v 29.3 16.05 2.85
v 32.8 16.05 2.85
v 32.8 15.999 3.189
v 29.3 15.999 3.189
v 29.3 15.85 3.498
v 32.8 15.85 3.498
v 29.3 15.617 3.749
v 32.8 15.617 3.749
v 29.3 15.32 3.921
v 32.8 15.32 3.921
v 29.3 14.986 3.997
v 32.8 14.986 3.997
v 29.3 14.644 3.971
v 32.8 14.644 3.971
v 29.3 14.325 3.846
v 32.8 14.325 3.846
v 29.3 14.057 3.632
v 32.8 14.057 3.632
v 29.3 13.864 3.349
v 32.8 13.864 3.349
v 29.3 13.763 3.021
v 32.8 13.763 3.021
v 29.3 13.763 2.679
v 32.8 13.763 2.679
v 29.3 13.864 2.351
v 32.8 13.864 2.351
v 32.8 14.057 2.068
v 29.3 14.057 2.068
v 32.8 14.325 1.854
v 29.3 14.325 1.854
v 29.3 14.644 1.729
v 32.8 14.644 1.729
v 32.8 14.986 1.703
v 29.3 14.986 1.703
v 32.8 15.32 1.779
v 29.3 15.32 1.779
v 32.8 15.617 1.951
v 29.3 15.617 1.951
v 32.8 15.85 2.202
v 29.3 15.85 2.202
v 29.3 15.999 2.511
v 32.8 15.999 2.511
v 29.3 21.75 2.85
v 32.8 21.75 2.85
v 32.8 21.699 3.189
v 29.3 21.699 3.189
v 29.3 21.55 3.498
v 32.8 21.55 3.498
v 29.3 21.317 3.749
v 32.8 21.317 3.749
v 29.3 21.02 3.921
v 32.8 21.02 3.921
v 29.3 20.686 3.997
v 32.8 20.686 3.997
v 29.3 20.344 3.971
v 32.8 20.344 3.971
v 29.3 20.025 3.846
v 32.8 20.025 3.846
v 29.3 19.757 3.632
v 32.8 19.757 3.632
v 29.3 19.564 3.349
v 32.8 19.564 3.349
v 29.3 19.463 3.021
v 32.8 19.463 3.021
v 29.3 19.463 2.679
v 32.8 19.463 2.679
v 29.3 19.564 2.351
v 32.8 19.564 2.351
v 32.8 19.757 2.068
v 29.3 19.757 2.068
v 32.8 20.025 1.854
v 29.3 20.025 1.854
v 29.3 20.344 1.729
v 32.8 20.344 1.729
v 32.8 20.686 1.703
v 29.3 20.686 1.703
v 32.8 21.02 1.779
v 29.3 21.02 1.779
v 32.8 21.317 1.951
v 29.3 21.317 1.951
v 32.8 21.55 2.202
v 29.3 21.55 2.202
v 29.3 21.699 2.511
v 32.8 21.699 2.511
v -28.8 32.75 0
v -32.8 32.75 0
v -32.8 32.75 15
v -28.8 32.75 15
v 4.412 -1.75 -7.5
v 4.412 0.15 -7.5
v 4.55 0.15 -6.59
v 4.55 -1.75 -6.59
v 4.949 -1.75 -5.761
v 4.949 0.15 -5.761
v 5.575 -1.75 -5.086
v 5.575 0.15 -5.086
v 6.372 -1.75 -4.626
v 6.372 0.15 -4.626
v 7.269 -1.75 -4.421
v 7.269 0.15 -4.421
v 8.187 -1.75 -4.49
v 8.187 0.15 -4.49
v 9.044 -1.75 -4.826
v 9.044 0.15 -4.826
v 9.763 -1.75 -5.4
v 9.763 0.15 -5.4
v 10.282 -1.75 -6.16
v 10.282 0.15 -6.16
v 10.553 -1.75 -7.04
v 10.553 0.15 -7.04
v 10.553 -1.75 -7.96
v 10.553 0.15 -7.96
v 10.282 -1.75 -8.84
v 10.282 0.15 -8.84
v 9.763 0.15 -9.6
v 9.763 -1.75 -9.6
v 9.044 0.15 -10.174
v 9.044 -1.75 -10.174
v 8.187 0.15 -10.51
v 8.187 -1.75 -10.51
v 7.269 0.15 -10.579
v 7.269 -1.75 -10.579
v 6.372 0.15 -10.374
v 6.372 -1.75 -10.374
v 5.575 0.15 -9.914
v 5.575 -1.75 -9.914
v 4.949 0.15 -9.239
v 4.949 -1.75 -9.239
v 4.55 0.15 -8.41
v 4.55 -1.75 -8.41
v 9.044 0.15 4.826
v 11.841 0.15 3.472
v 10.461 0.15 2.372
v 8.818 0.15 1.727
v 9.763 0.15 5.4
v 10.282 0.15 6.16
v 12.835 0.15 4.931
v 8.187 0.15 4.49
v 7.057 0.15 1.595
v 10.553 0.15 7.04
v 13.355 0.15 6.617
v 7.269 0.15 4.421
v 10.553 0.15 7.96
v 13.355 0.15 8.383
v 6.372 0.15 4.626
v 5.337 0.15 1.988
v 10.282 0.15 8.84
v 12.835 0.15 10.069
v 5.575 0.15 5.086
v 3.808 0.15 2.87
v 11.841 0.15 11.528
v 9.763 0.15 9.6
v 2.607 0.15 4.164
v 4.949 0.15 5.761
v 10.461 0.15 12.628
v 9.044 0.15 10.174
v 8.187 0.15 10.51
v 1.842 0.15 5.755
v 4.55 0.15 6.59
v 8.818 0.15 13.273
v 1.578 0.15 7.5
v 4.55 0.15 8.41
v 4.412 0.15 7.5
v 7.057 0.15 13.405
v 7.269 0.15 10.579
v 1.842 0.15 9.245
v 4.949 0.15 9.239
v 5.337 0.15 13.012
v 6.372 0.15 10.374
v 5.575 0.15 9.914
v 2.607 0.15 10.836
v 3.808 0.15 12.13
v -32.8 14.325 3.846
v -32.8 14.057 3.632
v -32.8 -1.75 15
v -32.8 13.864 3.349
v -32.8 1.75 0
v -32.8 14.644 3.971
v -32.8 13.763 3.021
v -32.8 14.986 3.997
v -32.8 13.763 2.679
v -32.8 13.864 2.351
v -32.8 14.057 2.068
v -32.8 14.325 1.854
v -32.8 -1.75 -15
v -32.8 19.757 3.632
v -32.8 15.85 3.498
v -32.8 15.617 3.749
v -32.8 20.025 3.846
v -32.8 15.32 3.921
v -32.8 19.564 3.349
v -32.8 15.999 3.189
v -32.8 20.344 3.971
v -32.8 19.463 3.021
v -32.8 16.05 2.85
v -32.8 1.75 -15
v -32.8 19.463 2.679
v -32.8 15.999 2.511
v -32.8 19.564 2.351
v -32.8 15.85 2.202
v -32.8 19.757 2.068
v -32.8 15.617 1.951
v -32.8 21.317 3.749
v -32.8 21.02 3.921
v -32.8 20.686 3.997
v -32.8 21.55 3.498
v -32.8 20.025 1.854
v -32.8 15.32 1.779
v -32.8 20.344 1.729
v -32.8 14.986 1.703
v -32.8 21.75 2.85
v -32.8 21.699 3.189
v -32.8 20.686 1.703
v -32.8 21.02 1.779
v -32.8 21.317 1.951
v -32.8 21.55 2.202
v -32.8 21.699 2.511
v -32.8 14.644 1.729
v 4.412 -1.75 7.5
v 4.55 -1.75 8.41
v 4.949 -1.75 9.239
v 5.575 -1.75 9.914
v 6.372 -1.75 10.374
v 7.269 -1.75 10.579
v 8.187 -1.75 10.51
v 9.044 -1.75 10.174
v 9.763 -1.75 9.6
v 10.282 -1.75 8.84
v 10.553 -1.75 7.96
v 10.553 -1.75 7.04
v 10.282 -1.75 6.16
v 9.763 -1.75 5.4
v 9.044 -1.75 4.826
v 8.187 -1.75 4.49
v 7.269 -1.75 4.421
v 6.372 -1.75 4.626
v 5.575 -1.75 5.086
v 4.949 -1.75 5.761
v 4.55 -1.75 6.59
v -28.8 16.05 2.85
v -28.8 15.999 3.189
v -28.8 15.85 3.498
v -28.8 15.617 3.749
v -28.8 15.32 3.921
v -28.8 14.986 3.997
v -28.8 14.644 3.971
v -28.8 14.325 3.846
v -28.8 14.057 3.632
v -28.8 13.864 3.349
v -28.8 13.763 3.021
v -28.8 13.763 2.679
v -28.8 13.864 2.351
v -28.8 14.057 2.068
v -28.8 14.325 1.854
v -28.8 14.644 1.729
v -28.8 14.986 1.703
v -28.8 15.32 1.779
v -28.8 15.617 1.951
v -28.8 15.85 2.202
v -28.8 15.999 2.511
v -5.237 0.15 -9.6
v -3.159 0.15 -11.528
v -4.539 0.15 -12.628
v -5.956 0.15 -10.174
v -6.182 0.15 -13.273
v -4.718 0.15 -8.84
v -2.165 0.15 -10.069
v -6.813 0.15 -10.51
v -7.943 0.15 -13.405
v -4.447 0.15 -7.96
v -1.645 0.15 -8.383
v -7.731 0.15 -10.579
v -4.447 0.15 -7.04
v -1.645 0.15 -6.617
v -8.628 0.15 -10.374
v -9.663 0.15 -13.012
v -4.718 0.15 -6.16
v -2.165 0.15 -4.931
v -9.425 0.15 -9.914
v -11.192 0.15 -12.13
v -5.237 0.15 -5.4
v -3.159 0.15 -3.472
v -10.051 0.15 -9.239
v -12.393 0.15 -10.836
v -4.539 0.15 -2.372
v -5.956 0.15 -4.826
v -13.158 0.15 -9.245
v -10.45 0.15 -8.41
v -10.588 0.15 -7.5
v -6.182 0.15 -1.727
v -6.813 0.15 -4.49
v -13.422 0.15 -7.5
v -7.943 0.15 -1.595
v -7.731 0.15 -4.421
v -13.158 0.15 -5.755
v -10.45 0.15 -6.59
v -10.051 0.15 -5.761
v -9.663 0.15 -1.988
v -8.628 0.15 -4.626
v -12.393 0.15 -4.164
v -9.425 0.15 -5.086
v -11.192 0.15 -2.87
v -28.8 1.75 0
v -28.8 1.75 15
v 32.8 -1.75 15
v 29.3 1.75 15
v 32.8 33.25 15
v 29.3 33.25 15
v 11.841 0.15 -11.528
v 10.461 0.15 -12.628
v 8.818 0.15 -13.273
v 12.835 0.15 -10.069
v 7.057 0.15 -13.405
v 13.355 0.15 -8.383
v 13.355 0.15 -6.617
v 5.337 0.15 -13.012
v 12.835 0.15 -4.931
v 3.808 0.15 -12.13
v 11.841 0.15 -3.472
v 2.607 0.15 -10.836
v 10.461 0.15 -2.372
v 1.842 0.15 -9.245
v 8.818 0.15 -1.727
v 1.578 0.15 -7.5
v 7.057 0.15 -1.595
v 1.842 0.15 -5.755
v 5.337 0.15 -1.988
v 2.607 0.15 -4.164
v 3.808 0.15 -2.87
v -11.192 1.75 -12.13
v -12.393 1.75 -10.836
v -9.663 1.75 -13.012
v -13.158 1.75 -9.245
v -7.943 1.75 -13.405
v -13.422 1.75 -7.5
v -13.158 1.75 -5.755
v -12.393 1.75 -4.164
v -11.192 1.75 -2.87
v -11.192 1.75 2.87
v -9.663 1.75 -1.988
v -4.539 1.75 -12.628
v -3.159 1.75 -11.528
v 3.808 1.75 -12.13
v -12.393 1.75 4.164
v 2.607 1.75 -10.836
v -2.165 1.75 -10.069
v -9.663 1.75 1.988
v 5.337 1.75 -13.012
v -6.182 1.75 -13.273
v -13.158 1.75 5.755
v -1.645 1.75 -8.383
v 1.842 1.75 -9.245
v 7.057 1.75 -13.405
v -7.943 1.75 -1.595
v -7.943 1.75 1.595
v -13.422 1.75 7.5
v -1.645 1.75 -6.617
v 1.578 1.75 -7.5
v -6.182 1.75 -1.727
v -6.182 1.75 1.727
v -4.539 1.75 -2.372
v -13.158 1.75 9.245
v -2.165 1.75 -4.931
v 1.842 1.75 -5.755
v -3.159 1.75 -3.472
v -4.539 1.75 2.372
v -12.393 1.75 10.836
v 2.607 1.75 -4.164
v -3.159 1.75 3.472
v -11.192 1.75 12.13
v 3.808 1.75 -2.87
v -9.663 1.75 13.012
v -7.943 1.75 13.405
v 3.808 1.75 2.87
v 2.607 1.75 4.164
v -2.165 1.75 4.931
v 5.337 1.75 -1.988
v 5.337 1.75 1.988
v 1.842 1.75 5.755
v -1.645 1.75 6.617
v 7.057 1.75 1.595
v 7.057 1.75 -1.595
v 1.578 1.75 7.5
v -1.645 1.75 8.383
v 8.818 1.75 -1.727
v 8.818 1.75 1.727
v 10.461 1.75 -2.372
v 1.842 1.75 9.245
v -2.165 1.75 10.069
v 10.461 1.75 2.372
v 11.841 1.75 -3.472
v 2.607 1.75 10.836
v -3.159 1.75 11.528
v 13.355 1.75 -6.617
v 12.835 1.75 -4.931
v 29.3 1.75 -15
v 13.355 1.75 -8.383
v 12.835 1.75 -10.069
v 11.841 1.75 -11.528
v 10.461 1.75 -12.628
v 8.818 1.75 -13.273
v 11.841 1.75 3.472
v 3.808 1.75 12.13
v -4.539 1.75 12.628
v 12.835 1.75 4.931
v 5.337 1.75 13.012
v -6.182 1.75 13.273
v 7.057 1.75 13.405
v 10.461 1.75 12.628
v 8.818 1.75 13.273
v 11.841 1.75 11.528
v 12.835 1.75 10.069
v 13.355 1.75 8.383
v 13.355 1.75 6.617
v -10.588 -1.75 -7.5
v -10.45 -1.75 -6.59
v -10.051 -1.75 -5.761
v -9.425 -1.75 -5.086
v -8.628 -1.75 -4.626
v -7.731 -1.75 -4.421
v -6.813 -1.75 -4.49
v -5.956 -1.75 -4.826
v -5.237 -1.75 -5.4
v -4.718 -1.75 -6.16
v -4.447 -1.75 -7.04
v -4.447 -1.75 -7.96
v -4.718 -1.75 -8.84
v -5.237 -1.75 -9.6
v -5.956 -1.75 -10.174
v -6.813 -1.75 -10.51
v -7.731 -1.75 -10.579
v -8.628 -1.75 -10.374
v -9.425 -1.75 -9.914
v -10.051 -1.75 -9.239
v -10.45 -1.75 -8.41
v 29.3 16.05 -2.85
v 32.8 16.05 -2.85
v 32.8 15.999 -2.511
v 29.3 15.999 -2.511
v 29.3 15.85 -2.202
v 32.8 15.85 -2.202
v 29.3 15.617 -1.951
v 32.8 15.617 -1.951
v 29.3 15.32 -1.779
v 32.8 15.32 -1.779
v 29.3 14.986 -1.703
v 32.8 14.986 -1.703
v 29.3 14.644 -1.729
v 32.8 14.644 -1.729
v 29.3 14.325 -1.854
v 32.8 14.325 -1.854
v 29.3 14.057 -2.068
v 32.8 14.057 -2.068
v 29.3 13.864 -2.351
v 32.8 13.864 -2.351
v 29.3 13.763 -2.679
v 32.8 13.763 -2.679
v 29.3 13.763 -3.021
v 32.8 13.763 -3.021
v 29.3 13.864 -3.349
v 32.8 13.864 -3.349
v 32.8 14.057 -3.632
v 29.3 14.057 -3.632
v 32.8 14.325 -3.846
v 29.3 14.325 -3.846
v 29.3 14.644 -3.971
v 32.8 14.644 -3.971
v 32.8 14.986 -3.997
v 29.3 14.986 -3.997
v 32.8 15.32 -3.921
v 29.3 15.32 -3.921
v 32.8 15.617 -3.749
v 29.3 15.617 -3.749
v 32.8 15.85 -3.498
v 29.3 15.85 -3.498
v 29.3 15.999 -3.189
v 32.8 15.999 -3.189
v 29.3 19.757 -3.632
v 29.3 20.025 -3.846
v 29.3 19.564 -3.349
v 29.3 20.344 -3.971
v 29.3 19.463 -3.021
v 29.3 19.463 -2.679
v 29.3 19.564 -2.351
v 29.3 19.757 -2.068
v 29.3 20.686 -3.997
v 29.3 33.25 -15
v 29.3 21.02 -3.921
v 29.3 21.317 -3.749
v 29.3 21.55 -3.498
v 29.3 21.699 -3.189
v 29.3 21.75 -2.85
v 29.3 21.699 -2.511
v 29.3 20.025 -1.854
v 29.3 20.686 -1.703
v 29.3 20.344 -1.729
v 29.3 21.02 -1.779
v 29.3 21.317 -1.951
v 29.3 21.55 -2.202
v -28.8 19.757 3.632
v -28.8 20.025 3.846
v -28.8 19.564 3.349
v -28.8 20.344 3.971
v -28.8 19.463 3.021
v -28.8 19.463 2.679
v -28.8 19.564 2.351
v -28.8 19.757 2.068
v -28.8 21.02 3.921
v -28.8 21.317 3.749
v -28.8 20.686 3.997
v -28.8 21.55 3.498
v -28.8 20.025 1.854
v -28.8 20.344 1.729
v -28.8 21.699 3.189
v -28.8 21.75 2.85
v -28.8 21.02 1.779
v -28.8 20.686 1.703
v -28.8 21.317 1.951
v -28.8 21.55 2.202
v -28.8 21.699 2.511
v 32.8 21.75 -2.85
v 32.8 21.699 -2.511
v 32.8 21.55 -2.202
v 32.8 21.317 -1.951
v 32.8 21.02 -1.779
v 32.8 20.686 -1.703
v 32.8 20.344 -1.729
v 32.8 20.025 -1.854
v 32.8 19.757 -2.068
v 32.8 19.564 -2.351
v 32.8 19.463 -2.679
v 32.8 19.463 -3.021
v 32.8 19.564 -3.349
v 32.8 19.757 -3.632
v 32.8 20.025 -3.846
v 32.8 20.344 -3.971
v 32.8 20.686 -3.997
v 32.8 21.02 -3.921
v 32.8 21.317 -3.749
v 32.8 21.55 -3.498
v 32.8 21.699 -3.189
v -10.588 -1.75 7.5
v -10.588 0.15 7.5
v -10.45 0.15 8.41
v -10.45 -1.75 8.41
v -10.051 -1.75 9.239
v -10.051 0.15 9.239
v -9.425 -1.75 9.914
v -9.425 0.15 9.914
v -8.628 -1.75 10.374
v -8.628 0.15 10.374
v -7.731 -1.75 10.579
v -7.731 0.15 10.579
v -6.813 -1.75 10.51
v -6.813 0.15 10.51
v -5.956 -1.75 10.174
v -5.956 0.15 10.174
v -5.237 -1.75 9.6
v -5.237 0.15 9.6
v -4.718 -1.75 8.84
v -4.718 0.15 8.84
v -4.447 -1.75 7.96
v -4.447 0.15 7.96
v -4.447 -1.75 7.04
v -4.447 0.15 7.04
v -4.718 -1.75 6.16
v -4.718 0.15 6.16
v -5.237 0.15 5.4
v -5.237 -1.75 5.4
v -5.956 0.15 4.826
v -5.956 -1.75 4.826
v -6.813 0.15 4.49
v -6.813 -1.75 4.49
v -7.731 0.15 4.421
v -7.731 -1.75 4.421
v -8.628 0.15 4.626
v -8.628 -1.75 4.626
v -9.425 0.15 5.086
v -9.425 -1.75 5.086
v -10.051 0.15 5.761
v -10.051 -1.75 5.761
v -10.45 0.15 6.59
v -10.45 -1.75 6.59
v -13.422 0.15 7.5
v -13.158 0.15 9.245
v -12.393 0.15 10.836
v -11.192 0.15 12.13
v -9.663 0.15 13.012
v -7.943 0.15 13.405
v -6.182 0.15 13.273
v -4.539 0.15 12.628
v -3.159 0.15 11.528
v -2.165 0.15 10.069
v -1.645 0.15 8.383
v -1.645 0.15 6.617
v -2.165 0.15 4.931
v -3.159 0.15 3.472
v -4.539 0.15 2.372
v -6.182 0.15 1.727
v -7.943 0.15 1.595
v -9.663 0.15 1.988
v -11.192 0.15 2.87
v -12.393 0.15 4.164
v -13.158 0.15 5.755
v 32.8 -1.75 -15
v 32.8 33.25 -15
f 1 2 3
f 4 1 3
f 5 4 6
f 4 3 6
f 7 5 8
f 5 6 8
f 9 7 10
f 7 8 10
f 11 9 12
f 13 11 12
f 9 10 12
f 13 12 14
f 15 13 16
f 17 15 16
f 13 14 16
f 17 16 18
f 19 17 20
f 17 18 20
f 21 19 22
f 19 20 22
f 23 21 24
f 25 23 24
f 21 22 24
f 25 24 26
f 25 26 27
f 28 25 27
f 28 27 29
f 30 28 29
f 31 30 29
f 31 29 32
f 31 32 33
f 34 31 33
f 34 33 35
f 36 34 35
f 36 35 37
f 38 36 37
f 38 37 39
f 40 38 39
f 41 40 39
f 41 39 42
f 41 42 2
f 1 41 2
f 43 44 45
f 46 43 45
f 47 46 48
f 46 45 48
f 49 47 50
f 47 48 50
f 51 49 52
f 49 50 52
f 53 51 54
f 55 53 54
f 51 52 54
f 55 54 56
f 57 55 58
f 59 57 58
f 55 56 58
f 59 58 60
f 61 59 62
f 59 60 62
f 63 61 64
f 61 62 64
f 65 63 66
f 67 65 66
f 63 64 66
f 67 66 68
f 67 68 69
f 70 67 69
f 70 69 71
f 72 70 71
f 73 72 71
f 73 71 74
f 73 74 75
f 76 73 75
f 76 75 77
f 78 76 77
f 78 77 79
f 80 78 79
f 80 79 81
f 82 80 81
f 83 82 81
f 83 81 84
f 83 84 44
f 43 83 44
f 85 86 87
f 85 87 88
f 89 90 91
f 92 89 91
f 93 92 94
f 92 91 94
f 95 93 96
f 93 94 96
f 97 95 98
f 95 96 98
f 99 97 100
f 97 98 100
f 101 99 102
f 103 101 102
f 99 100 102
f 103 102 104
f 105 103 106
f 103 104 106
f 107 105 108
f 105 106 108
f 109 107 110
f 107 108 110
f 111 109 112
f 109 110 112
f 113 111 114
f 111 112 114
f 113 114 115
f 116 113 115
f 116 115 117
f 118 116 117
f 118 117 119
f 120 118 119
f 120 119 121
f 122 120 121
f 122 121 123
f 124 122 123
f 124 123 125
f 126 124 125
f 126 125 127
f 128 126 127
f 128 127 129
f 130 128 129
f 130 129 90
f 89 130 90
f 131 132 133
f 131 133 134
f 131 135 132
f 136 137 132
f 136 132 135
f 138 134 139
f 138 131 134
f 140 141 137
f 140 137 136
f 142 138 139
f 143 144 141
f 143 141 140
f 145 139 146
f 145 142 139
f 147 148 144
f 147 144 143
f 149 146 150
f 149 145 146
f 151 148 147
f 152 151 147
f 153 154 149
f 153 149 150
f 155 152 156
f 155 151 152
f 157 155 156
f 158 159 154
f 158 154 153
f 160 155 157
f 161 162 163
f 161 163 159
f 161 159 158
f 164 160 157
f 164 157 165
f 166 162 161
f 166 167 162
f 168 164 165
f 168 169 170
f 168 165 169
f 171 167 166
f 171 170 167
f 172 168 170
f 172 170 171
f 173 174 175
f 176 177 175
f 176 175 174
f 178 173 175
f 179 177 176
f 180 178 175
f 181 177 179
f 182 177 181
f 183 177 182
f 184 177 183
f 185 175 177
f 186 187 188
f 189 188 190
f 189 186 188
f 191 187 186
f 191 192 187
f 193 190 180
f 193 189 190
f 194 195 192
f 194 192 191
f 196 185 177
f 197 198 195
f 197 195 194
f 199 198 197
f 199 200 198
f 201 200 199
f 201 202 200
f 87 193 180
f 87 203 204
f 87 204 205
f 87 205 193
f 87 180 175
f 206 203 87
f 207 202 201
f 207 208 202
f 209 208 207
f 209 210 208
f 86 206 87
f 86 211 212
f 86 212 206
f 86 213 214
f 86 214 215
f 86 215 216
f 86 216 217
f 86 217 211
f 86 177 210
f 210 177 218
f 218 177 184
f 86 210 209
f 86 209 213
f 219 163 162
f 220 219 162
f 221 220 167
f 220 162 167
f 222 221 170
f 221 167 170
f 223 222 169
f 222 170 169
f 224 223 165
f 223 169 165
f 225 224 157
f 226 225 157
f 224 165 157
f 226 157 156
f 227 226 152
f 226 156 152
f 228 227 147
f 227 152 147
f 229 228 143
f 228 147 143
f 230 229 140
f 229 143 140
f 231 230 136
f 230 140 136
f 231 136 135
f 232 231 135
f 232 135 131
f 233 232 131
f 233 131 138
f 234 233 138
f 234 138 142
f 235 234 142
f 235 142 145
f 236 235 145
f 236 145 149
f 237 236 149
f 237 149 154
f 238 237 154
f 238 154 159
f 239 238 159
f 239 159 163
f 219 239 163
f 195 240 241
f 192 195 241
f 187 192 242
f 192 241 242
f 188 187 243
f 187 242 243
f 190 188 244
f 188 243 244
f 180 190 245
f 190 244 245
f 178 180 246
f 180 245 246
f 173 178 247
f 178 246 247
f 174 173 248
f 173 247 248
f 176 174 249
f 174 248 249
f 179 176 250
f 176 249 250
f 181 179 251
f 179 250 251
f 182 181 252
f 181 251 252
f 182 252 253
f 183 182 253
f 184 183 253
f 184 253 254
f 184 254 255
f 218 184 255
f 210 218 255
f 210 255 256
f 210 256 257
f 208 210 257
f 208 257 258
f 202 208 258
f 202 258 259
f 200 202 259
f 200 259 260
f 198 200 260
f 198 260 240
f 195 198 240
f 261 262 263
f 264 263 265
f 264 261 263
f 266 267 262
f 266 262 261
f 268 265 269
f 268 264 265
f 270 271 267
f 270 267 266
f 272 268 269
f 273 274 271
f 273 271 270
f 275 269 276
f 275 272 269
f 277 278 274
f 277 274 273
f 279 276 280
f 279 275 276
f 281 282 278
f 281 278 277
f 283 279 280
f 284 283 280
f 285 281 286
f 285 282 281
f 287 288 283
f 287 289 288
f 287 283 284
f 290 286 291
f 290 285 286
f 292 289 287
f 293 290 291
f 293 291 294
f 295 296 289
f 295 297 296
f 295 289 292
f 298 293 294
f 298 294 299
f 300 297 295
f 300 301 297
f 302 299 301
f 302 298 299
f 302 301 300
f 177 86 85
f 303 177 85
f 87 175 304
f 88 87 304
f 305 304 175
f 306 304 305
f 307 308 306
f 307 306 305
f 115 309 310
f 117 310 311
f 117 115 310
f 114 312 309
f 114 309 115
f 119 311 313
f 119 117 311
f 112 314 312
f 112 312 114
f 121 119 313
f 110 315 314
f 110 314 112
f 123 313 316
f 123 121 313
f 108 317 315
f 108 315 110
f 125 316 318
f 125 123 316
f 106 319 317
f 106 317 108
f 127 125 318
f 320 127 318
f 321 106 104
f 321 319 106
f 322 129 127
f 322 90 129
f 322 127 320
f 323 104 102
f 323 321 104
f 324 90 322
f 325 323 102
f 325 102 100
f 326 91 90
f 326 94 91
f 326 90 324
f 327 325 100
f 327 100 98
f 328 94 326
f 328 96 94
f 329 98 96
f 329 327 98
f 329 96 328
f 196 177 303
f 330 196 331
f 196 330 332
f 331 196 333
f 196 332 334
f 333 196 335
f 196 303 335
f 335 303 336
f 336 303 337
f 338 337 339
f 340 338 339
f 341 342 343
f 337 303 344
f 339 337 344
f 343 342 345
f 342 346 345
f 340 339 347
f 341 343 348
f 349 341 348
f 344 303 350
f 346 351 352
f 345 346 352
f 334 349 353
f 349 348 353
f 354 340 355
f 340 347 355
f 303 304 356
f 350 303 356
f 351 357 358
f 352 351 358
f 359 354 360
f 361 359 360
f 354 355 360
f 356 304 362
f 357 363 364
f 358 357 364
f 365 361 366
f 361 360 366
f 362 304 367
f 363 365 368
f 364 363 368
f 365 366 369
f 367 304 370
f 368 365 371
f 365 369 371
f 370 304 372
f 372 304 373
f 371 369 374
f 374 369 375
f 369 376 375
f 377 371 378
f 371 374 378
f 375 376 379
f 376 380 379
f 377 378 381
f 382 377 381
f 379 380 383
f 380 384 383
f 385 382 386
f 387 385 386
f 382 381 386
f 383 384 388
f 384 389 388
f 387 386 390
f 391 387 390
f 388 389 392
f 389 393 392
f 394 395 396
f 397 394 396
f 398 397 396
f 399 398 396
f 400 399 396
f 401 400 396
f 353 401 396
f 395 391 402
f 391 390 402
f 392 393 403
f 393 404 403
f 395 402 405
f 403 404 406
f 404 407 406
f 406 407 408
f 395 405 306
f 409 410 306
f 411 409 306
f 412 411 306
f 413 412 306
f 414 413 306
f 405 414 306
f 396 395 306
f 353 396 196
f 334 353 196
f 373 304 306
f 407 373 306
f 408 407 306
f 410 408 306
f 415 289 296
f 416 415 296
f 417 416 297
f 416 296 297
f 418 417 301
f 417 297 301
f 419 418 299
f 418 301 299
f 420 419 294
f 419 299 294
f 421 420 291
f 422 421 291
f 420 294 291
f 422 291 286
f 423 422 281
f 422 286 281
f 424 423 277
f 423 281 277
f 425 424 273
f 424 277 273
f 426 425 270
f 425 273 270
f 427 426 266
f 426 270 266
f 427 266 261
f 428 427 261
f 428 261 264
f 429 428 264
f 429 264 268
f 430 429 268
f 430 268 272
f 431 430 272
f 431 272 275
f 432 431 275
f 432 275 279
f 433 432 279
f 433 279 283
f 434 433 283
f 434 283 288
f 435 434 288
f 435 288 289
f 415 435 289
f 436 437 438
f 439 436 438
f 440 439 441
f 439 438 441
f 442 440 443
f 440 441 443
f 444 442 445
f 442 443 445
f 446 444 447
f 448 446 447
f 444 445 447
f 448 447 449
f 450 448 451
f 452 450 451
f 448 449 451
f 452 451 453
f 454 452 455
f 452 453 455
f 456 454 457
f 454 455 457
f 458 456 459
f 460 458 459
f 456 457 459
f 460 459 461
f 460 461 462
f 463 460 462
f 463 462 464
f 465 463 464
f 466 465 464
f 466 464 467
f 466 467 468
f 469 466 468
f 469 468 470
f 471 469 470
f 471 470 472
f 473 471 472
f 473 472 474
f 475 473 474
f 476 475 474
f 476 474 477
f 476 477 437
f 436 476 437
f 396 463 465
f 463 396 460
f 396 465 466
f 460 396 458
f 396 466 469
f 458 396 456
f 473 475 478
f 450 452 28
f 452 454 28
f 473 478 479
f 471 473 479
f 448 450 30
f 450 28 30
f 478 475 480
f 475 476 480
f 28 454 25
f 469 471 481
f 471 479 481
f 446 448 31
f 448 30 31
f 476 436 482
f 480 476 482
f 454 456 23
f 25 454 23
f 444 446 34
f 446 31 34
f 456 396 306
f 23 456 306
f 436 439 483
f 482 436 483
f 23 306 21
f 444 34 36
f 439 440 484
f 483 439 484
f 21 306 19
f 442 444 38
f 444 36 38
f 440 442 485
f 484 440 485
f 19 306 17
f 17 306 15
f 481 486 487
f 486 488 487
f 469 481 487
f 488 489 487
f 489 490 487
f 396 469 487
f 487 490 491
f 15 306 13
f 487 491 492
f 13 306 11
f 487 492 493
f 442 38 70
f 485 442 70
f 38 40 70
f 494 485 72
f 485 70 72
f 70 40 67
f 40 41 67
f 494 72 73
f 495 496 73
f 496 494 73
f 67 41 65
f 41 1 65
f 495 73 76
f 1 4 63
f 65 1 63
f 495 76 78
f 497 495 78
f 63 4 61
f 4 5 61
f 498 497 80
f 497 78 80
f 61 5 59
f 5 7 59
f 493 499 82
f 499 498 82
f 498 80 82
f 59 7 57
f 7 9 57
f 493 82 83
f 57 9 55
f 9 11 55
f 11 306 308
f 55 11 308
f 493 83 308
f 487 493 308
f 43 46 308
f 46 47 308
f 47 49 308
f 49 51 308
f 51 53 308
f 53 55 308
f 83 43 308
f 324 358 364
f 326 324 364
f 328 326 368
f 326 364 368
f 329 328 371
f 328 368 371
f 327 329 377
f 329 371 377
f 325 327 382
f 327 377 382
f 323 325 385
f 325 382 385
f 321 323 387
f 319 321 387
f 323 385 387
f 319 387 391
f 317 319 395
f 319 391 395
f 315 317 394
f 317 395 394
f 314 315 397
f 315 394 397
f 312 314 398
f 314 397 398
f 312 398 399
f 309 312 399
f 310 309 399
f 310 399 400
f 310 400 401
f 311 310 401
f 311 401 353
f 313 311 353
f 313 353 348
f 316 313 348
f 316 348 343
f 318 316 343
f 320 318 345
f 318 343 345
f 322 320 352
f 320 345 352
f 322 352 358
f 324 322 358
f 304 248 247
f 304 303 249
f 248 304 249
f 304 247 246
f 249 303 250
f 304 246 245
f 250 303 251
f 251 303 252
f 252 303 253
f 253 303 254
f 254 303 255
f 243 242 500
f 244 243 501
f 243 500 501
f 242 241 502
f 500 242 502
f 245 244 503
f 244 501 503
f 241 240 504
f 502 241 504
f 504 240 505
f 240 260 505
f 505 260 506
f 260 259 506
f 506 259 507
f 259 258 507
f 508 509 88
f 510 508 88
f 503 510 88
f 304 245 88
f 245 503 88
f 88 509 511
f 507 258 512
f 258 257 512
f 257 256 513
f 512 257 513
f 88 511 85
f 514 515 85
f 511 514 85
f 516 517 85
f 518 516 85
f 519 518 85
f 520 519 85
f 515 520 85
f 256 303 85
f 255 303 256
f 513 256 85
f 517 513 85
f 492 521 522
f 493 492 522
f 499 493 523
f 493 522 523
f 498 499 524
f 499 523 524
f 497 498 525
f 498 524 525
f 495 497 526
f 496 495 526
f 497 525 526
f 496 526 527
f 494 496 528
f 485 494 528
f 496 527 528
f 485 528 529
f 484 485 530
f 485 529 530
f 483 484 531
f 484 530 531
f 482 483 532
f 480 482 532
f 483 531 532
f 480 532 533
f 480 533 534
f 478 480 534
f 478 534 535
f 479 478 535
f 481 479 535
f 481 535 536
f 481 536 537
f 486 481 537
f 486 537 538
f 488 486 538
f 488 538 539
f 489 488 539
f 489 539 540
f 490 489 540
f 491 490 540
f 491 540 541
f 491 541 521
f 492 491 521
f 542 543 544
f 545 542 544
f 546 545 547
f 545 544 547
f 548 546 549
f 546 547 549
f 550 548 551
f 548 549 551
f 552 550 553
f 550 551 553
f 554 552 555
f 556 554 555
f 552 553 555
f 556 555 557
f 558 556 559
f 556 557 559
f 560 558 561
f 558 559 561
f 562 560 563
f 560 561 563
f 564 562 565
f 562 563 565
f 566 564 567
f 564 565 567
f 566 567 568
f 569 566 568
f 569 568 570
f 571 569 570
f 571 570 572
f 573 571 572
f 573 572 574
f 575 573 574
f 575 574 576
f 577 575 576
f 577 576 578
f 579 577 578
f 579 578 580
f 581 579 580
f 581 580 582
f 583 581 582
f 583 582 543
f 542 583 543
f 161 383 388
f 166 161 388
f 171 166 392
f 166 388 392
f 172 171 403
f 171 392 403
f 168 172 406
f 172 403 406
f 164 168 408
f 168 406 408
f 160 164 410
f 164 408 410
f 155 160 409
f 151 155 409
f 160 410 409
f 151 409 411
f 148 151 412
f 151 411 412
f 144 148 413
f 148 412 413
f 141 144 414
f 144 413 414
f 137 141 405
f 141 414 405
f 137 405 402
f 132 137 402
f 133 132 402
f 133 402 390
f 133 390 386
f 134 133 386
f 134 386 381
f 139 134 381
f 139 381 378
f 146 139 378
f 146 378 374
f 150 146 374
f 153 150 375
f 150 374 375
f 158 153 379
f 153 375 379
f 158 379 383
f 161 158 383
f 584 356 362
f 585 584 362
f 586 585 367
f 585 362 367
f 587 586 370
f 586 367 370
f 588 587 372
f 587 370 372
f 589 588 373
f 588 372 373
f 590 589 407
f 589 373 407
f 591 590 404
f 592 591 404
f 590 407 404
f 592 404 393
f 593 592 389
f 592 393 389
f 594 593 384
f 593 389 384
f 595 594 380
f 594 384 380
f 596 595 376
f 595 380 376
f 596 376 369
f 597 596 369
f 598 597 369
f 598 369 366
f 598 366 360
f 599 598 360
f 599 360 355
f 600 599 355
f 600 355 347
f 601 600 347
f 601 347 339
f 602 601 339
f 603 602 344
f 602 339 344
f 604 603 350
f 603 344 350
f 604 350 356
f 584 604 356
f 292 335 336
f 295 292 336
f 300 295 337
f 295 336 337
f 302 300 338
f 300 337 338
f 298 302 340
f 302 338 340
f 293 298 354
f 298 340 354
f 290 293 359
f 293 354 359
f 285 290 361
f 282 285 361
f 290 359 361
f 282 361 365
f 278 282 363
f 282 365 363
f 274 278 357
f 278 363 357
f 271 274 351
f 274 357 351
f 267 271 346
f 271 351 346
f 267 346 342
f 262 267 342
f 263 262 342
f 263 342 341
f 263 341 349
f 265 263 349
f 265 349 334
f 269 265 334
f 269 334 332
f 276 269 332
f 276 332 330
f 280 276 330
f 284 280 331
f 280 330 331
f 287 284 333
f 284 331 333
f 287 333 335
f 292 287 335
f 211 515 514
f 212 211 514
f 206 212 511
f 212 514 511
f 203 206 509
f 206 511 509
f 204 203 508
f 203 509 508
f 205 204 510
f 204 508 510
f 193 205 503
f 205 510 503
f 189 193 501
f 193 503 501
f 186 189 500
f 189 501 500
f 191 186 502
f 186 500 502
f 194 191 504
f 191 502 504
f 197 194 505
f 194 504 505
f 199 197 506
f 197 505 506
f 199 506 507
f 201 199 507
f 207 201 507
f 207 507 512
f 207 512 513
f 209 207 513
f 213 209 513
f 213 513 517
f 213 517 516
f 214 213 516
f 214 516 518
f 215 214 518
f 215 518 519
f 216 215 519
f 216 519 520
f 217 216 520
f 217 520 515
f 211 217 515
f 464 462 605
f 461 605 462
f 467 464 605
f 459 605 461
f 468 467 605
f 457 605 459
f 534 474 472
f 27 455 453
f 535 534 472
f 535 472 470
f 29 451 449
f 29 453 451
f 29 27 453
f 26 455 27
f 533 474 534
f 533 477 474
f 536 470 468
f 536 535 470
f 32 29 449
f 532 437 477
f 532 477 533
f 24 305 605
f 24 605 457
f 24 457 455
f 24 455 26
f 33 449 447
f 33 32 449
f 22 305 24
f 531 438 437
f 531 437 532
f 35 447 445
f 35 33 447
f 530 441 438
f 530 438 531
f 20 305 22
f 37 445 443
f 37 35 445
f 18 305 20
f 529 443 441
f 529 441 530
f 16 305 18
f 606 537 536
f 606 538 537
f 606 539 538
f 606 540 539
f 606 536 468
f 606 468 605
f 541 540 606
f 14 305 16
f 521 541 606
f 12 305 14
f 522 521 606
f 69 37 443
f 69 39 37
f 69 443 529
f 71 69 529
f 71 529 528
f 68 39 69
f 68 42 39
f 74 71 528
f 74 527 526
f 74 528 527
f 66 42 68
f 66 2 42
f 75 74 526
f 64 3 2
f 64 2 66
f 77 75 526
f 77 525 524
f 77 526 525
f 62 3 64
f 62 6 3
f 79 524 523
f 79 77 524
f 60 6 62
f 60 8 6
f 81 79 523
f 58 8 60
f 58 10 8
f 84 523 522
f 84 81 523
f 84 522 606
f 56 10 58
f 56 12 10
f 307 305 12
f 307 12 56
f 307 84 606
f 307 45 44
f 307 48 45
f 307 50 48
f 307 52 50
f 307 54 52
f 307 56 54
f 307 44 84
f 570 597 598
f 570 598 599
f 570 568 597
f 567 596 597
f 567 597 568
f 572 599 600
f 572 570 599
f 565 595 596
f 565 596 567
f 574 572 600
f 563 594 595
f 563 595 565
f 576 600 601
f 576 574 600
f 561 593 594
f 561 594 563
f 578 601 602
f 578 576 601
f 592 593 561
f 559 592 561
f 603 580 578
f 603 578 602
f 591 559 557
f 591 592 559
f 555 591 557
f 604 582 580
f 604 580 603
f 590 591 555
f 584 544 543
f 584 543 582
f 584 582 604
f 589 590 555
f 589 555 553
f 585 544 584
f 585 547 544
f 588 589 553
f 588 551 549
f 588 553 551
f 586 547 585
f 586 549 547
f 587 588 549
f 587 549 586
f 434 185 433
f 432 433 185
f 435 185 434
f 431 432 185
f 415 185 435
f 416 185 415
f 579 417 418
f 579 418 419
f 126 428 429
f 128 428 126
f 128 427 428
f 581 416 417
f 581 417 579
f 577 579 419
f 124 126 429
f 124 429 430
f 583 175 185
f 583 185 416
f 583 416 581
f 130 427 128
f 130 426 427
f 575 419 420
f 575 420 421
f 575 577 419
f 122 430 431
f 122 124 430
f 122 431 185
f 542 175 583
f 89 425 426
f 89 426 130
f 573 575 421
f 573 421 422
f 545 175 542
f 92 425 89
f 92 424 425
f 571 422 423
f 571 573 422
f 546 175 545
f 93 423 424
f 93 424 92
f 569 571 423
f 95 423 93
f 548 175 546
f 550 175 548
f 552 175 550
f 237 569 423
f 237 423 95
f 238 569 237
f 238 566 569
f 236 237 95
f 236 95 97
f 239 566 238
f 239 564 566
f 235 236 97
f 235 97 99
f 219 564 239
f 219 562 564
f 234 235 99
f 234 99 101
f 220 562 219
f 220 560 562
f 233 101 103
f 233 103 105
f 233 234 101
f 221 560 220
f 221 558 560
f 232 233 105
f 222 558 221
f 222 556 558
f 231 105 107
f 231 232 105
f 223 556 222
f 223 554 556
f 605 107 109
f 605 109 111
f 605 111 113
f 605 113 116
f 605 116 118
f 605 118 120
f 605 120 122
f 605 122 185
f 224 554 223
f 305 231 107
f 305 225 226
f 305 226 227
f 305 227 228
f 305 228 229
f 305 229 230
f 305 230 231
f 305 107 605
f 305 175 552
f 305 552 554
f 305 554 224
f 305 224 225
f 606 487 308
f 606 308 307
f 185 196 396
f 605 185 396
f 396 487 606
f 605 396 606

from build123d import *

# Parameters (mm, degrees)
F0_W      = 65.6
F0_H      = 30
F1_DEPTH  = 1.75
F2_W      = 3.5
F2_H      = 31.5
F3_DEPTH  = 15
F4_W      = 4
F4_H      = 31
F5_DEPTH  = 15
F6_R      = 1.15
F7_DEPTH  = 200
F8_R      = 3.0875
F9_DEPTH  = 25
F10_R     = 5.9215
F11_DEPTH = 1.6


with BuildPart() as f1:
    # F0 (on Front) → F1 (new body, symmetric)
    with BuildSketch(Plane.XZ):
        Rectangle(F0_W, F0_H)
    extrude(amount=F1_DEPTH, both=True)

    # F2 (on Top) → F3 (join, symmetric)
    with BuildSketch(Plane.XY):
        with Locations((31.05, 17.5)):
            Rectangle(F2_W, F2_H)
    extrude(amount=F3_DEPTH, both=True)

    # F4 (on Top) → F5 (join)
    with BuildSketch(Plane.XY):
        with Locations((-30.8, 17.25)):
            Rectangle(F4_W, F4_H)
    extrude(amount=F5_DEPTH)

    # F6 (on face) → F7 (cut)
    with BuildSketch(Plane.YZ.offset(32.8)):
        with Locations((14.9, 2.85)):
            Circle(F6_R)
        with Locations((20.6, 2.85)):
            Circle(F6_R)
        with Locations((14.9, -2.85)):
            Circle(F6_R)
        with Locations((20.6, -2.85)):
            Circle(F6_R)
    extrude(amount=-F7_DEPTH, mode=Mode.SUBTRACT)

    # F8 (on face) → F9 (cut)
    with BuildSketch(Plane(origin=(0, 1.75, 0), x_dir=(-1, 0, 0), z_dir=(0, 1, 0))):
        with Locations((-7.5, 7.5)):
            Circle(F8_R)
        with Locations((-7.5, -7.5)):
            Circle(F8_R)
        with Locations((7.5, 7.5)):
            Circle(F8_R)
        with Locations((7.5, -7.5)):
            Circle(F8_R)
    extrude(amount=-F9_DEPTH, mode=Mode.SUBTRACT)

    # F10 (on face) → F11 (cut)
    with BuildSketch(Plane(origin=(0, 1.75, 0), x_dir=(-1, 0, 0), z_dir=(0, 1, 0))):
        with Locations((-7.5, 7.5)):
            Circle(F10_R)
        with Locations((-7.5, -7.5)):
            Circle(F10_R)
        with Locations((7.5, -7.5)):
            Circle(F10_R)
        with Locations((7.5, 7.5)):
            Circle(F10_R)
    extrude(amount=-F11_DEPTH, mode=Mode.SUBTRACT)


solid = f1.part
